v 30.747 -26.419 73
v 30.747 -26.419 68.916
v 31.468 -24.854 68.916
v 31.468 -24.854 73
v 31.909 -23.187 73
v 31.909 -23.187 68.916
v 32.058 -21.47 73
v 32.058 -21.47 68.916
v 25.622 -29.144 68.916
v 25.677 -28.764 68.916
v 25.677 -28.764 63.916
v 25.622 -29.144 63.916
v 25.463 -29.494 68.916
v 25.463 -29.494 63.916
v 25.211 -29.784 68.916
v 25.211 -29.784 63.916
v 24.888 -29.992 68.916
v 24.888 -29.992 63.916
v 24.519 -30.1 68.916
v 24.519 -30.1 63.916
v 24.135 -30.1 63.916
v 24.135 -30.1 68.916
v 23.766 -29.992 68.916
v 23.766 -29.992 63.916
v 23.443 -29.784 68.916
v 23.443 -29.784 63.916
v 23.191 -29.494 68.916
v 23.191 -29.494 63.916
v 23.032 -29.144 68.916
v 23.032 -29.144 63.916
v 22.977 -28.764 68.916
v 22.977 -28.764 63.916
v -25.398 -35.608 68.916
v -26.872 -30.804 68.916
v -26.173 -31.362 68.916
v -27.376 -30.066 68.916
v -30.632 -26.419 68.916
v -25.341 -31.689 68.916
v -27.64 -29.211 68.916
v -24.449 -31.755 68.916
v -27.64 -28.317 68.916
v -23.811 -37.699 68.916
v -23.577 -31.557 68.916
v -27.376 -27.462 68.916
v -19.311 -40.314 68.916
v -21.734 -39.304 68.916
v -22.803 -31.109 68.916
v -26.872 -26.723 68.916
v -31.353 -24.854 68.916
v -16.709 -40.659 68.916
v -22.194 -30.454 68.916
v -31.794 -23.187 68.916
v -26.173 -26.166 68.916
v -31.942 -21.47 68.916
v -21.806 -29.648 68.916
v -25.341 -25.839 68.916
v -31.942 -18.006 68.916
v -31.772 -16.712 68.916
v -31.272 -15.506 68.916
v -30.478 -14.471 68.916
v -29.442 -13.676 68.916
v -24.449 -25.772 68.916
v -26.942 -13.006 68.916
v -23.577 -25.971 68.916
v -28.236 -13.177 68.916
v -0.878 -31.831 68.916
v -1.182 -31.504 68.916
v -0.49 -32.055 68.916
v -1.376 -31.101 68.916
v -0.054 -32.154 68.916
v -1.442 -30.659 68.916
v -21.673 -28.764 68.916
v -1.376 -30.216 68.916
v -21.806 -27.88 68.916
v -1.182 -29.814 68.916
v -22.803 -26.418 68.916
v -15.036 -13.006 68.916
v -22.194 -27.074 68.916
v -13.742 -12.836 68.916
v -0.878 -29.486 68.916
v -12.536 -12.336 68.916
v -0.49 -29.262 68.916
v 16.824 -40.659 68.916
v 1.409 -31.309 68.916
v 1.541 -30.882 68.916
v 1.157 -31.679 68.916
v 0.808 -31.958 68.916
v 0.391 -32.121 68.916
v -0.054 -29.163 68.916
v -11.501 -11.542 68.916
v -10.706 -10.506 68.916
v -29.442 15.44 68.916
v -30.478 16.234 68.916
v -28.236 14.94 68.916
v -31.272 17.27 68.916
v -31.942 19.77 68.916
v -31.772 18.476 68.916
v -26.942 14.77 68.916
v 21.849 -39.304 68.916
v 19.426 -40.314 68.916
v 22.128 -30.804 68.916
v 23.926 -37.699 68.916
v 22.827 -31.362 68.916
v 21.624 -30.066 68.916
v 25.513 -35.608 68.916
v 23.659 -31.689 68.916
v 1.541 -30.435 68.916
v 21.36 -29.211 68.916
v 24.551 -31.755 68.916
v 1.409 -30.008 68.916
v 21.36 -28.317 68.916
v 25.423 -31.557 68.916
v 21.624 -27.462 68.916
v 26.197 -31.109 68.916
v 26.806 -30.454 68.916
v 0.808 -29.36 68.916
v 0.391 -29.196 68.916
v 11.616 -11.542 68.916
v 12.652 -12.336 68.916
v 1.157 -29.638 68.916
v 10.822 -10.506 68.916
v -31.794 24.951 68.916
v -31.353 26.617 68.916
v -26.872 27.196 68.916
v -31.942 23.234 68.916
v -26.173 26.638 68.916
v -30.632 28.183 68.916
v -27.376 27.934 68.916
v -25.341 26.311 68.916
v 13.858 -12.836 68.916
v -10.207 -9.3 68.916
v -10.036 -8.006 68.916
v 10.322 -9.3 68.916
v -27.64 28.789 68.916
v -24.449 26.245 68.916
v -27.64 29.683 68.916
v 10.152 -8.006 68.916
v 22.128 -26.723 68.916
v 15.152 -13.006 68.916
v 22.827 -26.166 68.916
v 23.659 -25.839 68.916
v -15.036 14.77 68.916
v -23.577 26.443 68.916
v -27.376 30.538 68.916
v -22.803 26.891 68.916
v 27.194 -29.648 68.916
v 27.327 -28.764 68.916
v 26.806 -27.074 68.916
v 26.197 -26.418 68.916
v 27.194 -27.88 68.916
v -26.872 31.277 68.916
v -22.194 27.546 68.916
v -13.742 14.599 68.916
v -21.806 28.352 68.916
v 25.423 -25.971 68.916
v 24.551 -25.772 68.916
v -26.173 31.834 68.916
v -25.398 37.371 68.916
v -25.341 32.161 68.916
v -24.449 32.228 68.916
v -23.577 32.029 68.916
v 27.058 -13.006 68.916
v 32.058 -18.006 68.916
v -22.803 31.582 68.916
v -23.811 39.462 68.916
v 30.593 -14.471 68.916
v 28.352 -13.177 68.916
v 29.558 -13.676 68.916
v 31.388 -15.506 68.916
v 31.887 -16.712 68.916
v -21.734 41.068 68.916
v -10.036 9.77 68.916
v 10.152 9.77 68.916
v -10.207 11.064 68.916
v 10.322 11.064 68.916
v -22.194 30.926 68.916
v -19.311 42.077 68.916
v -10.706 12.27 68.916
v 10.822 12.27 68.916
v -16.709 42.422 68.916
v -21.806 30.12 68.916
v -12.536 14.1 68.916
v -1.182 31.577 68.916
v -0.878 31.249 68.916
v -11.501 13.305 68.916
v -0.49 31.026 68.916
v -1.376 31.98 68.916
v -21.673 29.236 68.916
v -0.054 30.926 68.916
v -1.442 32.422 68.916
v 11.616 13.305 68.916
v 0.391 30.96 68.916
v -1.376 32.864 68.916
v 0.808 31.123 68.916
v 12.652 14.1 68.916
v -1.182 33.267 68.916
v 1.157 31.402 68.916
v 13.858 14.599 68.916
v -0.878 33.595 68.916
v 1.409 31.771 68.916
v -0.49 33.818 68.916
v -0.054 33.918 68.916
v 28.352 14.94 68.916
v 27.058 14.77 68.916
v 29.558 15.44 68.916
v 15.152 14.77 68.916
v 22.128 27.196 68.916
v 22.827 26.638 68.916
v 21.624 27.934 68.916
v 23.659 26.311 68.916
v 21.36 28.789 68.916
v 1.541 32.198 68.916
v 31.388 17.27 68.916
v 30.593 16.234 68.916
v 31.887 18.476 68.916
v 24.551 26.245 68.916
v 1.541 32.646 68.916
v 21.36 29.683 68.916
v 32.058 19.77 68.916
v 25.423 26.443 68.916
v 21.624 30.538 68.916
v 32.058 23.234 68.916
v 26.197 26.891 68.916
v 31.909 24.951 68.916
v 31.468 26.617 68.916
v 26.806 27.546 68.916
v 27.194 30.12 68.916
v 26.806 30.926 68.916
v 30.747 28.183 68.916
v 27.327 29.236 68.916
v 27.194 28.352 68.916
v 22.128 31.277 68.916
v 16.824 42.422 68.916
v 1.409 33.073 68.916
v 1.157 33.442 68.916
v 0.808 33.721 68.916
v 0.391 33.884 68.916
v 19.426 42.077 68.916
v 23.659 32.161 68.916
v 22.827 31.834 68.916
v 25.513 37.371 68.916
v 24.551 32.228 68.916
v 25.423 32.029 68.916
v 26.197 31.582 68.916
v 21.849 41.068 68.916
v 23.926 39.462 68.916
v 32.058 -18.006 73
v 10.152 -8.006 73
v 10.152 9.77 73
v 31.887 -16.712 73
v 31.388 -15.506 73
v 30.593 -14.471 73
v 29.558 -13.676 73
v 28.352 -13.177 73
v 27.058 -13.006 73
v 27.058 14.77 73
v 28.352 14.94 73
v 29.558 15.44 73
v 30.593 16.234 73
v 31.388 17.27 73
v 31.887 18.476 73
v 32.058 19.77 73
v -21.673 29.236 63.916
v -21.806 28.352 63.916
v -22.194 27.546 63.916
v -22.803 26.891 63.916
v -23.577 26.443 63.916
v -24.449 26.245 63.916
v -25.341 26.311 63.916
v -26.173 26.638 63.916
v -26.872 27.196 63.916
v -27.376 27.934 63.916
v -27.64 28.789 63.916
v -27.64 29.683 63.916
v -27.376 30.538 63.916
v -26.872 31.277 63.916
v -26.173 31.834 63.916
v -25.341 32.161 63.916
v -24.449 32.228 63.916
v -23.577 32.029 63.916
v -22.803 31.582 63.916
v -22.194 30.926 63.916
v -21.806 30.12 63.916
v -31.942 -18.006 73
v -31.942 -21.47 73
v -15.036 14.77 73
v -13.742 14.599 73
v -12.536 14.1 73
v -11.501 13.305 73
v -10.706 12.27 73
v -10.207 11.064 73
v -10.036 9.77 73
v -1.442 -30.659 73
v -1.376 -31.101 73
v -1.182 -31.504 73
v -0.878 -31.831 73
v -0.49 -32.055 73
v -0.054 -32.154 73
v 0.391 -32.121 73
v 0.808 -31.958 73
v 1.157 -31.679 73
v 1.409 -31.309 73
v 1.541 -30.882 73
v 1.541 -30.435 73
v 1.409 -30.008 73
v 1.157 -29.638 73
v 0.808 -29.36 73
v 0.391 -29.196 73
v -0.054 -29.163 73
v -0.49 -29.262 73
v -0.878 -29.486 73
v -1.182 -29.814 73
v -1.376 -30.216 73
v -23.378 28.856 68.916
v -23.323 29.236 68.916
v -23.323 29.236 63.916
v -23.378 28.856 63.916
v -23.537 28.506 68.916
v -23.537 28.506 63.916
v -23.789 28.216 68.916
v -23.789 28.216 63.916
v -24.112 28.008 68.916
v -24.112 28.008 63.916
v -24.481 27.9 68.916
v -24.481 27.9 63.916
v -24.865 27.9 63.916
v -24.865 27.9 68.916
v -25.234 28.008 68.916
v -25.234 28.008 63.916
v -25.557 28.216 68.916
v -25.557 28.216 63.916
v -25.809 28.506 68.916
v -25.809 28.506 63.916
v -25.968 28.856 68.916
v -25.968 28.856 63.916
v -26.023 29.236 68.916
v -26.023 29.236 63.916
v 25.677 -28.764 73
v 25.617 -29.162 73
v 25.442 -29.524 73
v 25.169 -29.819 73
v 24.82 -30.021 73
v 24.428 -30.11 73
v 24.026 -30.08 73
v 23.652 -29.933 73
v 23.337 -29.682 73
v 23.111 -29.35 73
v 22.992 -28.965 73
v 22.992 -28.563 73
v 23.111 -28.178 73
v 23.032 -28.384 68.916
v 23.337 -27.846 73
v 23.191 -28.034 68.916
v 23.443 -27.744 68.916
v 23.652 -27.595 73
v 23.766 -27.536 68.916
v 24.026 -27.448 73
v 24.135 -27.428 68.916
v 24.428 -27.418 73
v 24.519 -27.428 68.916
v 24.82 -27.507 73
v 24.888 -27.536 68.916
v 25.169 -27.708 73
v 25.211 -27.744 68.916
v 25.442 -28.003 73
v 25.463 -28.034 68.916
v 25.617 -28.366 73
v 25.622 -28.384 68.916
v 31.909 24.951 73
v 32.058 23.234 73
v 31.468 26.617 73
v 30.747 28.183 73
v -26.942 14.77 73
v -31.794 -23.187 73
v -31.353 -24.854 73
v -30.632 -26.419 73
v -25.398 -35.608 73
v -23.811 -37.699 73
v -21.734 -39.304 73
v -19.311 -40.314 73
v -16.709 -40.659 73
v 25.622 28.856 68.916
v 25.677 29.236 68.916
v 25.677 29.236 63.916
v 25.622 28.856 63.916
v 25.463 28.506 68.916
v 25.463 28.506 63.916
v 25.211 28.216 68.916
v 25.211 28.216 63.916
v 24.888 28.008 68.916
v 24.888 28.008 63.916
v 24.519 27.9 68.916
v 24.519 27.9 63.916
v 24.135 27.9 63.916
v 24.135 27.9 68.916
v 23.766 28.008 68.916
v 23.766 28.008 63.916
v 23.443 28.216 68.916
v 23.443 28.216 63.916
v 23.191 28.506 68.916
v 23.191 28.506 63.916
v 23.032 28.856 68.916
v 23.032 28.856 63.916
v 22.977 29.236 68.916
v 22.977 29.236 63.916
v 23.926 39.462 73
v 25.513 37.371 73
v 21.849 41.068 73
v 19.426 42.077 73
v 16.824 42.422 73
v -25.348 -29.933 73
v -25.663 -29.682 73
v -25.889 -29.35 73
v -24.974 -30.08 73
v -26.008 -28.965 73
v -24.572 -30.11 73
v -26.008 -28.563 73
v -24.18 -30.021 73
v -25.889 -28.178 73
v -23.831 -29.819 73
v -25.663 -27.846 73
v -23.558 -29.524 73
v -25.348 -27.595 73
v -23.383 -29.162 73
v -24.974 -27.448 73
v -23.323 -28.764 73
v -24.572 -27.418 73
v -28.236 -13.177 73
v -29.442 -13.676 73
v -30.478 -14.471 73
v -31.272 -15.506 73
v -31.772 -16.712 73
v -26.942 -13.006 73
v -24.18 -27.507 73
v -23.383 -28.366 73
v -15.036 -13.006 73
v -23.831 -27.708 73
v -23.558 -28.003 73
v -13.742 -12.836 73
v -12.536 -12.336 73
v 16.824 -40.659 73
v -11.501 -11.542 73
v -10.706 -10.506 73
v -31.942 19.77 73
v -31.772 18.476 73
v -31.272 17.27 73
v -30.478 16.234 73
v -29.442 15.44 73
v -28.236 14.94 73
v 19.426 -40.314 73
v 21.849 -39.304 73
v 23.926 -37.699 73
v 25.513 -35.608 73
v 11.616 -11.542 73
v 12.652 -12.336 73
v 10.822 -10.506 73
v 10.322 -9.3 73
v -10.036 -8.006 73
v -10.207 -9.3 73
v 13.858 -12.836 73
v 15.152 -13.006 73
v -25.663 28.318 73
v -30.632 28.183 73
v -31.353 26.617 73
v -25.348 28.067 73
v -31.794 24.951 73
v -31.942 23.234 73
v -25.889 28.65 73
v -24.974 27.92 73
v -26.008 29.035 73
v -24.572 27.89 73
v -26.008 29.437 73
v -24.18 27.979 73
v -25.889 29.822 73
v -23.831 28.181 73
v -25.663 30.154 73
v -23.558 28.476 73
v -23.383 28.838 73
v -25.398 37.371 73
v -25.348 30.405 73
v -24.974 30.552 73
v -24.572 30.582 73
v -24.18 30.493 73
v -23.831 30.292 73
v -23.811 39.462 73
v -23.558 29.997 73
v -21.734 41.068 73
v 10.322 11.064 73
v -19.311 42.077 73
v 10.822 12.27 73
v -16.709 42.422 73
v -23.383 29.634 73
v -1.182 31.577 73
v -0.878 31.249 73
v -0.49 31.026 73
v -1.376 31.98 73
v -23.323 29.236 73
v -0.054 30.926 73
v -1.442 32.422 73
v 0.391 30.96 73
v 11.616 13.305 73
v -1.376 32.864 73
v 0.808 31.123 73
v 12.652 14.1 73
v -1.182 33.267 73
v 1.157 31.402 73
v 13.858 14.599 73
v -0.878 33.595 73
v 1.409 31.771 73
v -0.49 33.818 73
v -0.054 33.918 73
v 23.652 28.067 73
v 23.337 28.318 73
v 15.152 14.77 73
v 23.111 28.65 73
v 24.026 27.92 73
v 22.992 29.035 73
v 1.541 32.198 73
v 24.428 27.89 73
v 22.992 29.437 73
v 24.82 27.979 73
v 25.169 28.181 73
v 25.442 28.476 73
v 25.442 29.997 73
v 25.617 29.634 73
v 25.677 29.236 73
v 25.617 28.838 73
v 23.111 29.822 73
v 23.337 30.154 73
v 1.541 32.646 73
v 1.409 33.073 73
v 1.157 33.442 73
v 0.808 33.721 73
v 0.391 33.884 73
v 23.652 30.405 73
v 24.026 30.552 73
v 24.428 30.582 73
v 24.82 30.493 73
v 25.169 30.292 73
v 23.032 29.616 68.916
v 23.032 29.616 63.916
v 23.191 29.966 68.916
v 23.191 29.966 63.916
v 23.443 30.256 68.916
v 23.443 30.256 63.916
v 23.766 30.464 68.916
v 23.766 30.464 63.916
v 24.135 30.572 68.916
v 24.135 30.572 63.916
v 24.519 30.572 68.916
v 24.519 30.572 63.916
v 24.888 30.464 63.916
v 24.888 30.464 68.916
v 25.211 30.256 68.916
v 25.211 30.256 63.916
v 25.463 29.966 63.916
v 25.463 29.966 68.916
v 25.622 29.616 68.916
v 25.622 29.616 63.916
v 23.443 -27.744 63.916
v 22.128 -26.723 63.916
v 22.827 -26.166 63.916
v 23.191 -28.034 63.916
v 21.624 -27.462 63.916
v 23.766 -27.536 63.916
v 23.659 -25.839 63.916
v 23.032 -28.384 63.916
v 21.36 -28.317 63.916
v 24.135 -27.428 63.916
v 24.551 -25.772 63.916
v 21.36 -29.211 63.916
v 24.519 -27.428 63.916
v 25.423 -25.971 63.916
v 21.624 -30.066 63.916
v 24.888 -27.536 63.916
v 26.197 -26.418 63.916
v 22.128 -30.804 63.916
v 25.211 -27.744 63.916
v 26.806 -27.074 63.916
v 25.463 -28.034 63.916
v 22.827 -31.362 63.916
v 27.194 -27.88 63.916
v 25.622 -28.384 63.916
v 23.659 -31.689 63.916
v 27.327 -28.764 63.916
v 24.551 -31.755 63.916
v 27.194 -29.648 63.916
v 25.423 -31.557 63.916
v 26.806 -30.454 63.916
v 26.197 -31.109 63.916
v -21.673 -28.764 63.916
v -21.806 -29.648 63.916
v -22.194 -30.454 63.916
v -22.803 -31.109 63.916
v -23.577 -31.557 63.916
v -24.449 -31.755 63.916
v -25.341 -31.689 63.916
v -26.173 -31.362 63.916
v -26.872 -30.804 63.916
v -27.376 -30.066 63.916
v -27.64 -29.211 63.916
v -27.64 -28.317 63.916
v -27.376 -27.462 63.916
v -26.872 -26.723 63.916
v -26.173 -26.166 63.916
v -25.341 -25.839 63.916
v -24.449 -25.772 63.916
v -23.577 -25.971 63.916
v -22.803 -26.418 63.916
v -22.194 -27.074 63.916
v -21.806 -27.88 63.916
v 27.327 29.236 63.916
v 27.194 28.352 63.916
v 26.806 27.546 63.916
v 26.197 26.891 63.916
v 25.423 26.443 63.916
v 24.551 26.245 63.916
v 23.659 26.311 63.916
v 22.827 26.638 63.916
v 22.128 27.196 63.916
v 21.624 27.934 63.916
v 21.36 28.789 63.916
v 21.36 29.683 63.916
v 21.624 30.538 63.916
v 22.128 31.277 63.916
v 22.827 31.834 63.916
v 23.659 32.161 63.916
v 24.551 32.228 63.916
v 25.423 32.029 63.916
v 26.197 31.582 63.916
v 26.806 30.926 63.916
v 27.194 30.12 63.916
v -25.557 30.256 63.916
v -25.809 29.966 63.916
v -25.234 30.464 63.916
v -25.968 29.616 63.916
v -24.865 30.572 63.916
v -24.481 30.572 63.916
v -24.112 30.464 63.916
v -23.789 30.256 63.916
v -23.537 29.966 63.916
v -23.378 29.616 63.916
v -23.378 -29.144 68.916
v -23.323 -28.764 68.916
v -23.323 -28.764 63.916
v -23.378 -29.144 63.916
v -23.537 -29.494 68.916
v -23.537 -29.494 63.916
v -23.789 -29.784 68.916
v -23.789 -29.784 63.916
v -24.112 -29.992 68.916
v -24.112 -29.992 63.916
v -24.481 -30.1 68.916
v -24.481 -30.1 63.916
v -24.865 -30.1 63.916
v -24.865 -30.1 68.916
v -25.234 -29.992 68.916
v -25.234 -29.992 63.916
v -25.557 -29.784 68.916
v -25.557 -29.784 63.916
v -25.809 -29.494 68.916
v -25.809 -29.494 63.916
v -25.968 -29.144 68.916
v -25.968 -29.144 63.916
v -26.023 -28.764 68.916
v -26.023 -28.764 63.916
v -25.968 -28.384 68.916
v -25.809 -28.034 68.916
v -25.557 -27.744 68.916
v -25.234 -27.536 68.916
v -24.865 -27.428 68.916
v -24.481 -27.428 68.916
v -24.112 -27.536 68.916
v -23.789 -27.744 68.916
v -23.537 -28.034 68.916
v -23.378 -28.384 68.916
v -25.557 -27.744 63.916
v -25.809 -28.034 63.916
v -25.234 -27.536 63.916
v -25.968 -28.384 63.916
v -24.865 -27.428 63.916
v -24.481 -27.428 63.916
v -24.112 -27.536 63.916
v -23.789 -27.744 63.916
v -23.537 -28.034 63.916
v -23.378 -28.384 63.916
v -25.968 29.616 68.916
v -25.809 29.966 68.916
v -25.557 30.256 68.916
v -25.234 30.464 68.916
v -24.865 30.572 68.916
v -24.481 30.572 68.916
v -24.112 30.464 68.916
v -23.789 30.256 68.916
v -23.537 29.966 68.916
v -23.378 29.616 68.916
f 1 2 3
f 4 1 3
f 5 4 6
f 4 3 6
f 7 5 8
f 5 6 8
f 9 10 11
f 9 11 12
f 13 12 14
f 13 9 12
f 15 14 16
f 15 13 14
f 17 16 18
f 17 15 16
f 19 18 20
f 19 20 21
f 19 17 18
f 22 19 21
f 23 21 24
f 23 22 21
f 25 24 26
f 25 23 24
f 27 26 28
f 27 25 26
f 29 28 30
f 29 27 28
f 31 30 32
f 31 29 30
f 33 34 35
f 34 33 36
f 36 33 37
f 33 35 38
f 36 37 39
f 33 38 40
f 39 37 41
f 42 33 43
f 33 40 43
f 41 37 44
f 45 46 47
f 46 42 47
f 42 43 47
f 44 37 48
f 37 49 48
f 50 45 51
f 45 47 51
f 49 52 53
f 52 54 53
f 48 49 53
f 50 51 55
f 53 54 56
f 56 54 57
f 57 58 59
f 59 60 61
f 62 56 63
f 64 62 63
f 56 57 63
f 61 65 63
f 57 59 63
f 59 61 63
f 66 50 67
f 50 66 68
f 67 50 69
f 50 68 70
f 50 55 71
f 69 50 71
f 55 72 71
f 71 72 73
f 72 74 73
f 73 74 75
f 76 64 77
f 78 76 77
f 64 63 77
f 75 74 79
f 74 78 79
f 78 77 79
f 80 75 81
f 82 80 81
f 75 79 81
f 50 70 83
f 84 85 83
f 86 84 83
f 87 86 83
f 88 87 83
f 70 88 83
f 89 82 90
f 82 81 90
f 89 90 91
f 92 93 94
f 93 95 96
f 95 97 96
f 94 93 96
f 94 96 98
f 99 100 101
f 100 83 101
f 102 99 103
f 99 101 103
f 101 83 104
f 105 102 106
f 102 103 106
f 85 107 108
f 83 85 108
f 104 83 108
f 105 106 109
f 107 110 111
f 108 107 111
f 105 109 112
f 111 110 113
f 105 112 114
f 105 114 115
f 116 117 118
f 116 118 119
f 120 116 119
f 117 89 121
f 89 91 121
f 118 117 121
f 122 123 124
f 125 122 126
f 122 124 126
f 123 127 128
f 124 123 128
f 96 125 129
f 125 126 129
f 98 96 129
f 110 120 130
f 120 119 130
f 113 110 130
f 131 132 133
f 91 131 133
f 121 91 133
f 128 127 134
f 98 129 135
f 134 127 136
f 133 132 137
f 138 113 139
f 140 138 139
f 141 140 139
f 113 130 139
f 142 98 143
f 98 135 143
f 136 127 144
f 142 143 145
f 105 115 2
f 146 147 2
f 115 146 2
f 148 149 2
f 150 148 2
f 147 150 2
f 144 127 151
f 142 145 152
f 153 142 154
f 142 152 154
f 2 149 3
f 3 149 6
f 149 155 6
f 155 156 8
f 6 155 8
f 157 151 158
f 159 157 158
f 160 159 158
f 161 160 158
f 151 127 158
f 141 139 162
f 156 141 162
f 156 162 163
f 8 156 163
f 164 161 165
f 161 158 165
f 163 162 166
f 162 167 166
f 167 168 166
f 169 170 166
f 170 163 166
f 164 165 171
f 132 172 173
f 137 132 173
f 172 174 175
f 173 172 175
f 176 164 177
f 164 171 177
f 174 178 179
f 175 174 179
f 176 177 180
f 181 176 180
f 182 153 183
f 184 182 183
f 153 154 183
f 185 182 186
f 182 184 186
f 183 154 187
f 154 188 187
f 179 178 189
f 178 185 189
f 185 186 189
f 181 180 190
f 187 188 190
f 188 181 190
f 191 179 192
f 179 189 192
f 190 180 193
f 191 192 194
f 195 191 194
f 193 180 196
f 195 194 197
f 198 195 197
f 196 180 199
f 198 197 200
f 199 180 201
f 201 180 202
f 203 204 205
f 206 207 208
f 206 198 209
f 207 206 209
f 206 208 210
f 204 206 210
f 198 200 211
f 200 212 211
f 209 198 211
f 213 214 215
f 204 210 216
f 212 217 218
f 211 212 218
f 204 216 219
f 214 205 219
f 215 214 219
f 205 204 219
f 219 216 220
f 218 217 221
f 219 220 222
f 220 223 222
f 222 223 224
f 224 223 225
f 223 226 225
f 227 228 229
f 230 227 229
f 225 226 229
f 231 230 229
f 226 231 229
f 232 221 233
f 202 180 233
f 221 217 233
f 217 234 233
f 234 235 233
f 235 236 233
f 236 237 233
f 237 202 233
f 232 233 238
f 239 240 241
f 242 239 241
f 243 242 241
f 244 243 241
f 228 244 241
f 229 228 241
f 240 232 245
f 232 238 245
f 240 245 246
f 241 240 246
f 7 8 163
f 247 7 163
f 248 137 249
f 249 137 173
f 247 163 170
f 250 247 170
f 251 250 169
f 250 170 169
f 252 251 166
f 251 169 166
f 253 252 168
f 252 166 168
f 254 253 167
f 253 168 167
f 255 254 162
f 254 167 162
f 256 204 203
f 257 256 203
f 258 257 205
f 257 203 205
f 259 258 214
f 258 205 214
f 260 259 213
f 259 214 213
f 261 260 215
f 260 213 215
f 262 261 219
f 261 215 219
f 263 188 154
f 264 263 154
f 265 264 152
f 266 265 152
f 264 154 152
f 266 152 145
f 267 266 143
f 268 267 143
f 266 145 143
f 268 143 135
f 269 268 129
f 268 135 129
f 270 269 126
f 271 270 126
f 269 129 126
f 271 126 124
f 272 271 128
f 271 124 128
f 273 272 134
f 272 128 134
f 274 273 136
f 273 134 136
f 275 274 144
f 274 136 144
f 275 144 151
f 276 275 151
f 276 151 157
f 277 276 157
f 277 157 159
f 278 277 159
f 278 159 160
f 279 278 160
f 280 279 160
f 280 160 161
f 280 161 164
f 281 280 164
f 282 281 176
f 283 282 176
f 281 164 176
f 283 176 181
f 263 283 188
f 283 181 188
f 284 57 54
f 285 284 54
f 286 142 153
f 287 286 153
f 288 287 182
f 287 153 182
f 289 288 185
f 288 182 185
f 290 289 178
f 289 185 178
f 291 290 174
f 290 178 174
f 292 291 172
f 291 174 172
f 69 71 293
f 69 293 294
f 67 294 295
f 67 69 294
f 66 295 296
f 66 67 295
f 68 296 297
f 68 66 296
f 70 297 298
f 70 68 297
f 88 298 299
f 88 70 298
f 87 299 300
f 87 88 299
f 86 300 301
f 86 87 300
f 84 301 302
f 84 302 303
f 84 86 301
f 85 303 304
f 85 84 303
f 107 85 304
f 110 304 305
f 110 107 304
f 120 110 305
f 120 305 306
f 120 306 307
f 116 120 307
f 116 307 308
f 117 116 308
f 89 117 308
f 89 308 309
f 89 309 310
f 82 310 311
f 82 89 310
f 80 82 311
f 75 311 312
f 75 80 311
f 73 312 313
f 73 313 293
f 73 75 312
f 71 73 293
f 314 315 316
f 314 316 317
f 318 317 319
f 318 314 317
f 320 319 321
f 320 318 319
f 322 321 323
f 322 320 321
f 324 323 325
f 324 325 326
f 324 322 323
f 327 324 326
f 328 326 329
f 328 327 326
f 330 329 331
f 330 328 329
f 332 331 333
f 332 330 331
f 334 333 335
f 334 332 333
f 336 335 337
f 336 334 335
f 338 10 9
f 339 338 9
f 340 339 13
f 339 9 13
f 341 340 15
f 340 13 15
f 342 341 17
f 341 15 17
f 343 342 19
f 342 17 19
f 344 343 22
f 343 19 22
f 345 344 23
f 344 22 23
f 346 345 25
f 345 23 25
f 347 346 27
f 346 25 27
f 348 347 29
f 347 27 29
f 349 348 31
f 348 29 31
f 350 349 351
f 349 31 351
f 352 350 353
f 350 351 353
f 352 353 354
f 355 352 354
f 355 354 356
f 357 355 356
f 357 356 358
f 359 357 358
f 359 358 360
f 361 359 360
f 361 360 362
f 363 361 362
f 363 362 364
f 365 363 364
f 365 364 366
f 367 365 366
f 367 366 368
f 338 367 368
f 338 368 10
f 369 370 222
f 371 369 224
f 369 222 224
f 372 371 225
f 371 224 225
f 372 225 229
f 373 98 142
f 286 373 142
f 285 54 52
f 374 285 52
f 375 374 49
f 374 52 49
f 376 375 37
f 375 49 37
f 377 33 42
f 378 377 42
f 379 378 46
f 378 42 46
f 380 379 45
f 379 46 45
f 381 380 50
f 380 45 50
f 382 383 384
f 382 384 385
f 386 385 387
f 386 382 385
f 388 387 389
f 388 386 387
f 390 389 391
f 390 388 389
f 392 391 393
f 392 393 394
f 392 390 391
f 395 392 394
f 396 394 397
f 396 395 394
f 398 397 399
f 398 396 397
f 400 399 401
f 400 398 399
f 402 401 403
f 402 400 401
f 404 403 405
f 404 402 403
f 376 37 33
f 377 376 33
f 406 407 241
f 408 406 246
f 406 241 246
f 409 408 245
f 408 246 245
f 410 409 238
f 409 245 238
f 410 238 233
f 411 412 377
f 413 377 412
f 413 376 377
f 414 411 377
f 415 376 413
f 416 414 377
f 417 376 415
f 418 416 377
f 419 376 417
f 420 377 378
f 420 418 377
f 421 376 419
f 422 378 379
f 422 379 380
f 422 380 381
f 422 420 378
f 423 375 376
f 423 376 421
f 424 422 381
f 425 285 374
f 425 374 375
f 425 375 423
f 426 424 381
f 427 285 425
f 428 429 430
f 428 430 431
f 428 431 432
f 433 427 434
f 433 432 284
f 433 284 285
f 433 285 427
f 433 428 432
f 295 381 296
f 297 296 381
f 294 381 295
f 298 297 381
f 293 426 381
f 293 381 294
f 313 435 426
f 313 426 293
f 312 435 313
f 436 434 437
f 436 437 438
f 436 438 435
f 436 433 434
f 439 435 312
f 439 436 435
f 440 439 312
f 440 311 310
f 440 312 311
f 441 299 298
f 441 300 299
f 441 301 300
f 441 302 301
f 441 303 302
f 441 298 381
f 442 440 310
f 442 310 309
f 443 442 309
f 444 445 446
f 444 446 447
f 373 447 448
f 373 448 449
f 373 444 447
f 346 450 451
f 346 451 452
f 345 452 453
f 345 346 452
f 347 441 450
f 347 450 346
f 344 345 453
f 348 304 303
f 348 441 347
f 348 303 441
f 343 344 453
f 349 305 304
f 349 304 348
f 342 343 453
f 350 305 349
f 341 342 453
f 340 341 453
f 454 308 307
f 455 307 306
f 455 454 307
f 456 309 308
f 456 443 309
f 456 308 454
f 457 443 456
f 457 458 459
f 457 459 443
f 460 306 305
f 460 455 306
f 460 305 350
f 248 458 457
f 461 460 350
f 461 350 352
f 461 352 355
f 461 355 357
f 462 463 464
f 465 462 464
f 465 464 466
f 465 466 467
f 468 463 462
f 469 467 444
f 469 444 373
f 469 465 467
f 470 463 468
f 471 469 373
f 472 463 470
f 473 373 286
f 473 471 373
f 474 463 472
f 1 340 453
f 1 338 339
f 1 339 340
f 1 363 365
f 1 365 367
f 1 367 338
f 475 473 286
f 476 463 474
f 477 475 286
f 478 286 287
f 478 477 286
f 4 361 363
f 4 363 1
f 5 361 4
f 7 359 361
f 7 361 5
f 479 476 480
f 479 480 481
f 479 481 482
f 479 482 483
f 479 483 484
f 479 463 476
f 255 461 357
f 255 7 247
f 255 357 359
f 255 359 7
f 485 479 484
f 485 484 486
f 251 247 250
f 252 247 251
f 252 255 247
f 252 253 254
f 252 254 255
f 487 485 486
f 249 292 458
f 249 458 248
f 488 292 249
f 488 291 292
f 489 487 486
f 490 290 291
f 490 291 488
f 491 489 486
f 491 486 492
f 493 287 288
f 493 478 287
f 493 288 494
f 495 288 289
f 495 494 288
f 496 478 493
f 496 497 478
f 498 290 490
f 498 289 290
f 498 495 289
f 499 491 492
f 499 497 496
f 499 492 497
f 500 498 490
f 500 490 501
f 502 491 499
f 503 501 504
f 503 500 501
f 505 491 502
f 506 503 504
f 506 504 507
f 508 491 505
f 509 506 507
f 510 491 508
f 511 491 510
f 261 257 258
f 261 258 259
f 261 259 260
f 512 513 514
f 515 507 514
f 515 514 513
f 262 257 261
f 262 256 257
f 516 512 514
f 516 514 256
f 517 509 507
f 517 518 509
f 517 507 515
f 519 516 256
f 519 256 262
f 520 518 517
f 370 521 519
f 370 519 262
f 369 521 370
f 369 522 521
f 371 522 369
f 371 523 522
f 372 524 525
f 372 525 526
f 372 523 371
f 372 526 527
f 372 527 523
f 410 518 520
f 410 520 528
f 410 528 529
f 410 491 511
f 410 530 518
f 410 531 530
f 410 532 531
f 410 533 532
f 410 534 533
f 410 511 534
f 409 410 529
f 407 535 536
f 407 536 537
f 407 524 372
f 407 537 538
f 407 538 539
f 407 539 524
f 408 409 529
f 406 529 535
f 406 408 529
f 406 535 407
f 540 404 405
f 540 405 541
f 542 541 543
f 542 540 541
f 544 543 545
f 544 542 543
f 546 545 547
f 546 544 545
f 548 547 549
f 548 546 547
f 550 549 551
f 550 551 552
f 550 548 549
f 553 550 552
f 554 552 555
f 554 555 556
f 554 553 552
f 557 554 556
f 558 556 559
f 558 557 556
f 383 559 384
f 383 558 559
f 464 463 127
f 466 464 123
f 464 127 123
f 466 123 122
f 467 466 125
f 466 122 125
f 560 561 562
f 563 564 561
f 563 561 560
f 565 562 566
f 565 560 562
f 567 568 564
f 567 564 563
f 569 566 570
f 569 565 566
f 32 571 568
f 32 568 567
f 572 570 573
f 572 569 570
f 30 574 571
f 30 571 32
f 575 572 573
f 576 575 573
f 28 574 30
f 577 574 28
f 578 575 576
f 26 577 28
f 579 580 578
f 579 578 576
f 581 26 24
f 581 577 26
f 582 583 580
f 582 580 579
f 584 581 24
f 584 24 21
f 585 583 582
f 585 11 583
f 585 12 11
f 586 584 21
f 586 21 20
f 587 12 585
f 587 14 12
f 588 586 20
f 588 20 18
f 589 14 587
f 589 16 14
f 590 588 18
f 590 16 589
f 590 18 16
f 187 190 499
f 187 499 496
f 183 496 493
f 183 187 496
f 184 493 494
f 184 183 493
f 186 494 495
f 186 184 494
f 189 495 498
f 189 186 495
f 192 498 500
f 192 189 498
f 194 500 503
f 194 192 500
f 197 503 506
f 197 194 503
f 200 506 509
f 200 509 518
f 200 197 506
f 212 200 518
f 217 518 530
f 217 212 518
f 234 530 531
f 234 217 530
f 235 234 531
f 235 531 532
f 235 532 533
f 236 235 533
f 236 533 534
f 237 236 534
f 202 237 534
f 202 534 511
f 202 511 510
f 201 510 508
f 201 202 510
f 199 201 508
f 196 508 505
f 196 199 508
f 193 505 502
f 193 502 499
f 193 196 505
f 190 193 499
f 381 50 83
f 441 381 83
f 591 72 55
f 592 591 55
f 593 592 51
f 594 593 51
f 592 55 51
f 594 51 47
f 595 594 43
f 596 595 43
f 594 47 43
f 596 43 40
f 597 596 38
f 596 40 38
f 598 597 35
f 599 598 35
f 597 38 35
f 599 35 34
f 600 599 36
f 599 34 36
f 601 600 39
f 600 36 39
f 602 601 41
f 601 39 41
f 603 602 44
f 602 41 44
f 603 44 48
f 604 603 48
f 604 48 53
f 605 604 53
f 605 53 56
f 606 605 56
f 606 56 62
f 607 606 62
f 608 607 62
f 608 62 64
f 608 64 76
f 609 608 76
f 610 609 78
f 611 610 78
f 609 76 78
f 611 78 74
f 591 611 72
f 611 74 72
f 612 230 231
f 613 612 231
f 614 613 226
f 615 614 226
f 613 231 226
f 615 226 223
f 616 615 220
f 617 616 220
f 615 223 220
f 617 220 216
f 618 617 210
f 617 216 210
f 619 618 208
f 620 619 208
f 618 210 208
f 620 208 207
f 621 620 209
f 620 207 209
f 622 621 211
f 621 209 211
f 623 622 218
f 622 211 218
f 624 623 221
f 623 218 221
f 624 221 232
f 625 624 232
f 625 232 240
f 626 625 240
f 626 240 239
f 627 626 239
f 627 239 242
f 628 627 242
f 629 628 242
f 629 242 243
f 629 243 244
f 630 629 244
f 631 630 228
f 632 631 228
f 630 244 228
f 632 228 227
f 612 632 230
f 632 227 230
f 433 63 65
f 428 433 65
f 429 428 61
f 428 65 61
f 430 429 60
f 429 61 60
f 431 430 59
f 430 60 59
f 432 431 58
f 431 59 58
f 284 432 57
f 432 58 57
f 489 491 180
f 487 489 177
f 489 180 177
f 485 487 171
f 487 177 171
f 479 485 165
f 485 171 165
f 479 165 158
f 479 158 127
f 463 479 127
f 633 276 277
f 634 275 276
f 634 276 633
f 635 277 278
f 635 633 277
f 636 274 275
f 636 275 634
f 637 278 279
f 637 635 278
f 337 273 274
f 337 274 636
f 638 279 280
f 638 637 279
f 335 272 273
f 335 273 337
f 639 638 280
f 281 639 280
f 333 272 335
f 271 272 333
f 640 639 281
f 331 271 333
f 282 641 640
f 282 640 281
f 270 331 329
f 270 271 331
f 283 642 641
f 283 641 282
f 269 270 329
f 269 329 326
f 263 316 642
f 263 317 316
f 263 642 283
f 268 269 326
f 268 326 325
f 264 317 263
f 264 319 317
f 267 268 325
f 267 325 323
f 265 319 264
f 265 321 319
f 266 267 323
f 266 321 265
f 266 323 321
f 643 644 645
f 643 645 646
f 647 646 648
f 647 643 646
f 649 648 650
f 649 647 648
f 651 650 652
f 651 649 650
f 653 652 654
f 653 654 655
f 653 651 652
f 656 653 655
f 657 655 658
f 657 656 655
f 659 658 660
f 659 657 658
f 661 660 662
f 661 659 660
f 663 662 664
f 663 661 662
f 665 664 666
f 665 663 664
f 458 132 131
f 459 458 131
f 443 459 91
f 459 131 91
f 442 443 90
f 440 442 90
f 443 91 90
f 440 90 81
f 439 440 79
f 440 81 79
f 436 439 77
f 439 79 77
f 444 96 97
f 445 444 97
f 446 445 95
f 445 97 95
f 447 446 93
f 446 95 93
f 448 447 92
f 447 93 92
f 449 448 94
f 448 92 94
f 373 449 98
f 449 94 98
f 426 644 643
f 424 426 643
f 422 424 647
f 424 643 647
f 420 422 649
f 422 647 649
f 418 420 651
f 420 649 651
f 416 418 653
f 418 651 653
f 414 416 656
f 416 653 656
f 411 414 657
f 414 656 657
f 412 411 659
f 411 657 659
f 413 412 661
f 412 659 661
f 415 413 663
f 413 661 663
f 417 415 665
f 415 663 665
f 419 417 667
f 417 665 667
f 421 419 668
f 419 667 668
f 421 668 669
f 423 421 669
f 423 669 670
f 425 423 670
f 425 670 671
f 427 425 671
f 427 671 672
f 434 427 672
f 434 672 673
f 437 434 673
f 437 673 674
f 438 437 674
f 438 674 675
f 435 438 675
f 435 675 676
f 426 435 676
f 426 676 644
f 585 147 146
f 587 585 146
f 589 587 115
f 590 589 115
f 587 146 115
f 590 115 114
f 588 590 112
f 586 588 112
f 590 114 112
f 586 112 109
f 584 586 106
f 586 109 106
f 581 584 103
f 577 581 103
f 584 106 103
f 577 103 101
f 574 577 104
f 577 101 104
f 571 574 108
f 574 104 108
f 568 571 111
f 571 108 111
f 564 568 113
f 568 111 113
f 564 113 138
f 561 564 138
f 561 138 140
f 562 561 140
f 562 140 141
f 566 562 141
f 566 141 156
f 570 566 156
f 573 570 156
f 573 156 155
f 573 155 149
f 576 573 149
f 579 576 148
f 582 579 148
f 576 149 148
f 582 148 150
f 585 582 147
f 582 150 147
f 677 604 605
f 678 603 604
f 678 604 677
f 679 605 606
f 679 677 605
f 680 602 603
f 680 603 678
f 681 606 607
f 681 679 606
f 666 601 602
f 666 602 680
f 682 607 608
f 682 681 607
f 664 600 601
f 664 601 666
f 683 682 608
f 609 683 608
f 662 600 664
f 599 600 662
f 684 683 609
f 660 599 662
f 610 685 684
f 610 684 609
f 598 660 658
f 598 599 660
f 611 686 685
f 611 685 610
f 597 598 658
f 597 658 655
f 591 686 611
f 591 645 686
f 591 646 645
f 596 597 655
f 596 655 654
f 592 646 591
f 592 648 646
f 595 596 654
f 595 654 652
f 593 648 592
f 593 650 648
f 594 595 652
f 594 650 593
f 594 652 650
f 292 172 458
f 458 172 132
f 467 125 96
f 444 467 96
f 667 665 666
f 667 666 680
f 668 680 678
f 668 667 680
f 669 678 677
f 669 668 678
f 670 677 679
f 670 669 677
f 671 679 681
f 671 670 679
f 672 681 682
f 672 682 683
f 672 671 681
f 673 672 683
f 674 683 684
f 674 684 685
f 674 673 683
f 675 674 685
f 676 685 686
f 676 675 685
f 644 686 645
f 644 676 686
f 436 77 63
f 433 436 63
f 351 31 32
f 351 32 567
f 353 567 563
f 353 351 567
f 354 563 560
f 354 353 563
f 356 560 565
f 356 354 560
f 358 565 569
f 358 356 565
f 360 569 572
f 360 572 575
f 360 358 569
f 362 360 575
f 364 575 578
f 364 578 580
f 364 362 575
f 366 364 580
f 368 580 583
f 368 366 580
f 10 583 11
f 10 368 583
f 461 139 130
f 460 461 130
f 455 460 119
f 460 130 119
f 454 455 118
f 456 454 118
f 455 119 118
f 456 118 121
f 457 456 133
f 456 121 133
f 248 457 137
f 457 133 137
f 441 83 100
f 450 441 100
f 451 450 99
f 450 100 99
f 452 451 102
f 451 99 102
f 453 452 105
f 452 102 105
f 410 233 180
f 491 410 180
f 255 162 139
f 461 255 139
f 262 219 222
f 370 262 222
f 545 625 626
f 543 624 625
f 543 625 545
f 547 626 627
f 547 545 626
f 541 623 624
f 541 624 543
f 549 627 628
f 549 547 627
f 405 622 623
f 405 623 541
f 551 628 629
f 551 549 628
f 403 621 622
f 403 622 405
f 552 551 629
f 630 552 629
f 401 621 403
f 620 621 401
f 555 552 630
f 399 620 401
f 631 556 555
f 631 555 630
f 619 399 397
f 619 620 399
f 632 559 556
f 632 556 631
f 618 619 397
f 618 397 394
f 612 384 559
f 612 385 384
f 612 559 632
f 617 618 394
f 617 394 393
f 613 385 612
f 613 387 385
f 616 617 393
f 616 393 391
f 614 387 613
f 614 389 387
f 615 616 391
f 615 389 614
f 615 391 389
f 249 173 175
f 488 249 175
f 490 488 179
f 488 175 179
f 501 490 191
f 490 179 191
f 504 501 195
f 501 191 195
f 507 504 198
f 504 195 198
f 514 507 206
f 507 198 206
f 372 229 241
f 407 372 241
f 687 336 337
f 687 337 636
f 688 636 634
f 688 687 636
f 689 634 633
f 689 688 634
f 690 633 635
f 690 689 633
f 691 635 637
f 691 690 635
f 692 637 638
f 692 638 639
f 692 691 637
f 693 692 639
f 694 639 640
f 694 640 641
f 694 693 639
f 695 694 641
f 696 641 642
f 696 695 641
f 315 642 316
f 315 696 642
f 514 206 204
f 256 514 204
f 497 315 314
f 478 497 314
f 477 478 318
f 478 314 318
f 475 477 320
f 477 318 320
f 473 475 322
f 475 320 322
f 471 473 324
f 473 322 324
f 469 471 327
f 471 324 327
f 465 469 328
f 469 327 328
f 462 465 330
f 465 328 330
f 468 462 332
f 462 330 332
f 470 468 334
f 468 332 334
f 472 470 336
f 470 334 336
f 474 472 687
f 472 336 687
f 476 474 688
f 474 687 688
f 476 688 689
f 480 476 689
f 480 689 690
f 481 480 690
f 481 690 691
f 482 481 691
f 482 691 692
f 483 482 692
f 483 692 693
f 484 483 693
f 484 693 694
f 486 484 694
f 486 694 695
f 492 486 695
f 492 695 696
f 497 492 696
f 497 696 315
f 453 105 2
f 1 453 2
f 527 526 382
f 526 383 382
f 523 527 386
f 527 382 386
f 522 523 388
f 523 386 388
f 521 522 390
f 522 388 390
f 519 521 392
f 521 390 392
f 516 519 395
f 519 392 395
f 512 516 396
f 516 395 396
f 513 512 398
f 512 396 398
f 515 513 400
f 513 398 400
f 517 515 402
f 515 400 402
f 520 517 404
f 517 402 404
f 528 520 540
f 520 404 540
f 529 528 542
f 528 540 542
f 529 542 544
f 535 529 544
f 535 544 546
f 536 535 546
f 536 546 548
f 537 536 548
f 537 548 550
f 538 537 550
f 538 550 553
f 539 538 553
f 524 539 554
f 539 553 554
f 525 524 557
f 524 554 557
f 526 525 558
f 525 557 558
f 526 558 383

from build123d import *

# Parameters (mm, degrees)
IZIM1_R                     = 1.5
IZIM1_R_2                   = 1.275
Y_KSEKLIK_EKSTR_ZYON1_DEPTH = 8
IZIM2_R                     = 4
KES_EKSTR_ZYON1_DEPTH       = 5
IZIM3_R                     = 3.5
KES_EKSTR_ZYON2_DEPTH       = 5
IZIM5_W                     = 11.833700998
IZIM5_H                     = 5.687133077
Y_KSEKLIK_EKSTR_ZYON2_DEPTH = 55
IZIM6_R                     = 1.5
KES_EKSTR_ZYON3_DEPTH       = 70
Y_KSEKLIK_EKSTR_ZYON3_DEPTH = 10
KES_EKSTR_ZYON4_START       = -10
IZIM8_R                     = 1.5
KES_EKSTR_ZYON4_DEPTH       = 10
IZIM9_W                     = 97.77314617
IZIM9_H                     = 81.30293778
KES_EKSTR_ZYON5_DEPTH       = 94.5
IZIM10_R                    = 3
IZIM10_R_2                  = 1.35
Y_KSEKLIK_EKSTR_ZYON4_DEPTH = 5
IZIM12_R                    = 1.35
KES_EKSTR_ZYON6_DEPTH       = 11.5


with BuildPart() as part:
    # Çizim1 → Yükseklik-Ekstrüzyon1 (new body)
    with BuildSketch(Plane.XY):
        with BuildLine():
            Line((-26.942326891, 14.769848309), (-15.036455376, 14.769848309))
            ThreePointArc((-15.036455376, 14.769848309), (-11.50092147, 13.305382214), (-10.036455376, 9.769848309))
            Line((-10.036455376, 9.769848309), (-10.036455376, -8.006371062))
            ThreePointArc((-10.036455376, -8.006371062), (-11.50092147, -11.541904968), (-15.036455376, -13.006371062))
            Line((-15.036455376, -13.006371062), (-26.942326891, -13.006371062))
            ThreePointArc((-26.942326891, -13.006371062), (-30.477860797, -14.470837156), (-31.942326891, -18.006371062))
            Line((-31.942326891, -18.006371062), (-31.942326891, -21.470074229))
            ThreePointArc((-31.942326891, -21.470074229), (-31.6091093, -24.030019123), (-30.63166332, -26.419360282))
            Line((-30.63166332, -26.419360282), (-25.398075072, -35.607838889))
            ThreePointArc((-25.398075072, -35.607838889), (-21.734031643, -39.304154624), (-16.708738643, -40.658552836))
            Line((-16.708738643, -40.658552836), (16.824084861, -40.658552836))
            ThreePointArc((16.824084861, -40.658552836), (21.849377861, -39.304154624), (25.513421289, -35.607838889))
            Line((25.513421289, -35.607838889), (30.747009537, -26.419360282))
            ThreePointArc((30.747009537, -26.419360282), (31.724455518, -24.030019123), (32.057673109, -21.470074229))
            Line((32.057673109, -21.470074229), (32.057673109, -18.006371062))
            ThreePointArc((32.057673109, -18.006371062), (30.593207015, -14.470837156), (27.057673109, -13.006371062))
            Line((27.057673109, -13.006371062), (15.151801594, -13.006371062))
            ThreePointArc((15.151801594, -13.006371062), (11.616267688, -11.541904968), (10.151801594, -8.006371062))
            Line((10.151801594, -8.006371062), (10.151801594, 9.769848309))
            ThreePointArc((10.151801594, 9.769848309), (11.616267688, 13.305382214), (15.151801594, 14.769848309))
            Line((15.151801594, 14.769848309), (27.057673109, 14.769848309))
            ThreePointArc((27.057673109, 14.769848309), (30.593207015, 16.234314403), (32.057673109, 19.769848309))
            Line((32.057673109, 19.769848309), (32.057673109, 23.233551476))
            ThreePointArc((32.057673109, 23.233551476), (31.724455518, 25.793496369), (30.747009537, 28.182837528))
            Line((30.747009537, 28.182837528), (25.513421289, 37.371316135))
            ThreePointArc((25.513421289, 37.371316135), (21.849377861, 41.06763187), (16.824084861, 42.422030083))
            Line((16.824084861, 42.422030083), (-16.708738643, 42.422030083))
            ThreePointArc((-16.708738643, 42.422030083), (-21.734031643, 41.06763187), (-25.398075072, 37.371316135))
            Line((-25.398075072, 37.371316135), (-30.63166332, 28.182837528))
            ThreePointArc((-30.63166332, 28.182837528), (-31.6091093, 25.793496369), (-31.942326891, 23.233551476))
            Line((-31.942326891, 23.233551476), (-31.942326891, 19.769848309))
            ThreePointArc((-31.942326891, 19.769848309), (-30.477860797, 16.234314403), (-26.942326891, 14.769848309))
        make_face()
        with Locations((20.284256069, 32.422030083)):
            Circle(IZIM1_R, mode=Mode.SUBTRACT)
        with Locations((-20.168909852, 32.422030083)):
            Circle(IZIM1_R, mode=Mode.SUBTRACT)
        with Locations((-20.168909852, -30.658552836)):
            Circle(IZIM1_R, mode=Mode.SUBTRACT)
        with Locations((20.284256069, -30.658552836)):
            Circle(IZIM1_R, mode=Mode.SUBTRACT)
        with Locations((22.057673109, -21.118261377)):
            Circle(IZIM1_R_2, mode=Mode.SUBTRACT)
        with Locations((-21.942326891, -21.118261377)):
            Circle(IZIM1_R_2, mode=Mode.SUBTRACT)
        with Locations((22.057673109, 22.881738623)):
            Circle(IZIM1_R_2, mode=Mode.SUBTRACT)
        with Locations((-21.942326891, 22.881738623)):
            Circle(IZIM1_R_2, mode=Mode.SUBTRACT)
        with Locations((0.057673109, 32.422030083)):
            Circle(IZIM1_R, mode=Mode.SUBTRACT)
        with Locations(Location((0.057673109, -30.658552836, 0), (0, 0, 180))):
            Circle(IZIM1_R, mode=Mode.SUBTRACT)
    extrude(amount=Y_KSEKLIK_EKSTR_ZYON1_DEPTH)

    # Çizim2 → Kes-Ekstrüzyon1 (cut)
    with BuildSketch(Plane(origin=(0, 0, 0), x_dir=(-1, 0, 0), z_dir=(0, 0, -1))):
        with Locations((-22.057673109, 22.881738623)):
            Circle(IZIM2_R)
        with Locations((21.942326891, 22.881738623)):
            Circle(IZIM2_R)
        with Locations((-22.057673109, -21.118261377)):
            Circle(IZIM2_R)
        with Locations((21.942326891, -21.118261377)):
            Circle(IZIM2_R)
        with Locations((-0.057673109, 32.422030083)):
            Circle(IZIM2_R)
        with Locations((-0.057673109, -30.658552836)):
            Circle(IZIM2_R)
    extrude(amount=-KES_EKSTR_ZYON1_DEPTH, mode=Mode.SUBTRACT)

    # Çizim3 → Kes-Ekstrüzyon2 (cut)
    with BuildSketch(Plane.XY.offset(8)):
        with Locations((-20.168909852, 32.422030083)):
            Circle(IZIM3_R)
        with Locations((20.284256069, 32.422030083)):
            Circle(IZIM3_R)
        with Locations((20.284256069, -30.658552836)):
            Circle(IZIM3_R)
        with Locations((-20.168909852, -30.658552836)):
            Circle(IZIM3_R)
    extrude(amount=-KES_EKSTR_ZYON2_DEPTH, mode=Mode.SUBTRACT)

    # Çizim5 → Yükseklik-Ekstrüzyon2 (add)
    with BuildSketch(Plane.XY.offset(8)):
        with Locations((0.057673109, 32.422030083)):
            Rectangle(IZIM5_W, IZIM5_H)
        with Locations((0.057673109, -30.658552837)):
            Rectangle(IZIM5_W, IZIM5_H)
    extrude(amount=Y_KSEKLIK_EKSTR_ZYON2_DEPTH)

    # Çizim6 → Kes-Ekstrüzyon3 (cut)
    with BuildSketch(Plane(origin=(0, 0, 8), x_dir=(-1, 0, 0), z_dir=(0, 0, -1))):
        with Locations((-0.057673109, -30.658552836)):
            Circle(IZIM6_R)
        with Locations((-0.057673109, 32.422030083)):
            Circle(IZIM6_R)
    extrude(amount=-KES_EKSTR_ZYON3_DEPTH, mode=Mode.SUBTRACT)

    # Çizim7 → Yükseklik-Ekstrüzyon3 (add)
    with BuildSketch(Plane.XY.offset(63)):
        with BuildLine():
            Line((-31.942326891, 23.233551476), (-31.942326891, 19.769848309))
            ThreePointArc((-31.942326891, 19.769848309), (-30.477860797, 16.234314403), (-26.942326891, 14.769848309))
            Line((-26.942326891, 14.769848309), (-15.036455376, 14.769848309))
            ThreePointArc((-15.036455376, 14.769848309), (-11.50092147, 13.305382214), (-10.036455376, 9.769848309))
            Line((-10.036455376, 9.769848309), (-10.036455376, -8.006371062))
            ThreePointArc((-10.036455376, -8.006371062), (-11.50092147, -11.541904968), (-15.036455376, -13.006371062))
            Line((-15.036455376, -13.006371062), (-26.942326891, -13.006371062))
            ThreePointArc((-26.942326891, -13.006371062), (-30.477860797, -14.470837156), (-31.942326891, -18.006371062))
            Line((-31.942326891, -18.006371062), (-31.942326891, -21.470074229))
            ThreePointArc((-31.942326891, -21.470074229), (-31.6091093, -24.030019123), (-30.63166332, -26.419360282))
            Line((-30.63166332, -26.419360282), (-25.398075072, -35.607838889))
            ThreePointArc((-25.398075072, -35.607838889), (-21.734031643, -39.304154624), (-16.708738643, -40.658552836))
            Line((-16.708738643, -40.658552836), (16.824084861, -40.658552836))
            ThreePointArc((16.824084861, -40.658552836), (21.849377861, -39.304154624), (25.513421289, -35.607838889))
            Line((25.513421289, -35.607838889), (30.747009537, -26.419360282))
            ThreePointArc((30.747009537, -26.419360282), (31.724455518, -24.030019123), (32.057673109, -21.470074229))
            Line((32.057673109, -21.470074229), (32.057673109, -18.006371062))
            ThreePointArc((32.057673109, -18.006371062), (30.593207015, -14.470837156), (27.057673109, -13.006371062))
            Line((27.057673109, -13.006371062), (15.151801594, -13.006371062))
            ThreePointArc((15.151801594, -13.006371062), (11.616267688, -11.541904968), (10.151801594, -8.006371062))
            Line((10.151801594, -8.006371062), (10.151801594, 9.769848309))
            ThreePointArc((10.151801594, 9.769848309), (11.616267688, 13.305382214), (15.151801594, 14.769848309))
            Line((15.151801594, 14.769848309), (27.057673109, 14.769848309))
            ThreePointArc((27.057673109, 14.769848309), (30.593207015, 16.234314403), (32.057673109, 19.769848309))
            Line((32.057673109, 19.769848309), (32.057673109, 23.233551476))
            ThreePointArc((32.057673109, 23.233551476), (31.724455518, 25.793496369), (30.747009537, 28.182837528))
            Line((30.747009537, 28.182837528), (25.513421289, 37.371316135))
            ThreePointArc((25.513421289, 37.371316135), (21.849377861, 41.06763187), (16.824084861, 42.422030083))
            Line((16.824084861, 42.422030083), (-16.708738643, 42.422030083))
            ThreePointArc((-16.708738643, 42.422030083), (-21.734031643, 41.06763187), (-25.398075072, 37.371316135))
            Line((-25.398075072, 37.371316135), (-30.63166332, 28.182837528))
            ThreePointArc((-30.63166332, 28.182837528), (-31.6091093, 25.793496369), (-31.942326891, 23.233551476))
        make_face()
    extrude(amount=Y_KSEKLIK_EKSTR_ZYON3_DEPTH)

    # Çizim8 → Kes-Ekstrüzyon4 (cut)
    with BuildSketch(Plane.XY.offset(73).offset(KES_EKSTR_ZYON4_START)):
        with Locations(Location((0.057673109, -30.658552836, 0), (0, 0, 180))):
            Circle(IZIM8_R)
        with Locations(Location((0.057673109, 32.422030083, 0), (0, 0, 180))):
            Circle(IZIM8_R)
    extrude(amount=KES_EKSTR_ZYON4_DEPTH, mode=Mode.SUBTRACT)

    # Çizim9 → Kes-Ekstrüzyon5 (cut, symmetric)
    with BuildSketch(Plane(origin=(0, 35.265596621, 0), x_dir=(1, 0, 0), z_dir=(0, 1, 0))):
        with Locations((-4.059878989, -28.264895805)):
            Rectangle(IZIM9_W, IZIM9_H)
    extrude(amount=KES_EKSTR_ZYON5_DEPTH, both=True, mode=Mode.SUBTRACT)

    # Çizim10 → Yükseklik-Ekstrüzyon4 (add)
    # profile 1 of 4: a face of its own
    with BuildSketch(Plane(origin=(0, 0, 68.916364695), x_dir=(-1, 0, 0), z_dir=(0, 0, -1))):
        with Locations(Location((24.673182088, -28.763886305, 0), (0, 0, 180))):
            Circle(IZIM10_R)
        with Locations((24.673182088, -28.763886305)):
            Circle(IZIM10_R_2, mode=Mode.SUBTRACT)
    # profile 2 of 4: a face of its own
    with BuildSketch(Plane(origin=(0, 0, 68.916364695), x_dir=(-1, 0, 0), z_dir=(0, 0, -1))):
        with Locations(Location((-24.326817912, -28.763886305, 0), (0, 0, 180))):
            Circle(IZIM10_R)
        with Locations((-24.326817912, -28.763886305)):
            Circle(IZIM10_R_2, mode=Mode.SUBTRACT)
    # profile 3 of 4: a face of its own
    with BuildSketch(Plane(origin=(0, 0, 68.916364695), x_dir=(-1, 0, 0), z_dir=(0, 0, -1))):
        with Locations(Location((-24.326817912, 29.236113695, 0), (0, 0, 180))):
            Circle(IZIM10_R)
        with Locations((-24.326817912, 29.236113695)):
            Circle(IZIM10_R_2, mode=Mode.SUBTRACT)
    # profile 4 of 4: a face of its own
    with BuildSketch(Plane(origin=(0, 0, 68.916364695), x_dir=(-1, 0, 0), z_dir=(0, 0, -1))):
        with Locations(Location((24.673182088, 29.236113695, 0), (0, 0, 180))):
            Circle(IZIM10_R)
        with Locations((24.673182088, 29.236113695)):
            Circle(IZIM10_R_2, mode=Mode.SUBTRACT)
    extrude(amount=Y_KSEKLIK_EKSTR_ZYON4_DEPTH)

    # Çizim12 → Kes-Ekstrüzyon6 (cut, symmetric)
    with BuildSketch(Plane(origin=(0, 0, 68.916364695), x_dir=(-1, 0, 0), z_dir=(0, 0, -1))):
        with Locations(Location((-24.326817912, -28.763886305, 0), (0, 0, 180))):
            Circle(IZIM12_R)
        with Locations(Location((24.673182088, -28.763886305, 0), (0, 0, 180))):
            Circle(IZIM12_R)
        with Locations(Location((24.673182088, 29.236113695, 0), (0, 0, 180))):
            Circle(IZIM12_R)
        with Locations(Location((-24.326817912, 29.236113695, 0), (0, 0, 180))):
            Circle(IZIM12_R)
    extrude(amount=KES_EKSTR_ZYON6_DEPTH, both=True, mode=Mode.SUBTRACT)


solid = part.part
